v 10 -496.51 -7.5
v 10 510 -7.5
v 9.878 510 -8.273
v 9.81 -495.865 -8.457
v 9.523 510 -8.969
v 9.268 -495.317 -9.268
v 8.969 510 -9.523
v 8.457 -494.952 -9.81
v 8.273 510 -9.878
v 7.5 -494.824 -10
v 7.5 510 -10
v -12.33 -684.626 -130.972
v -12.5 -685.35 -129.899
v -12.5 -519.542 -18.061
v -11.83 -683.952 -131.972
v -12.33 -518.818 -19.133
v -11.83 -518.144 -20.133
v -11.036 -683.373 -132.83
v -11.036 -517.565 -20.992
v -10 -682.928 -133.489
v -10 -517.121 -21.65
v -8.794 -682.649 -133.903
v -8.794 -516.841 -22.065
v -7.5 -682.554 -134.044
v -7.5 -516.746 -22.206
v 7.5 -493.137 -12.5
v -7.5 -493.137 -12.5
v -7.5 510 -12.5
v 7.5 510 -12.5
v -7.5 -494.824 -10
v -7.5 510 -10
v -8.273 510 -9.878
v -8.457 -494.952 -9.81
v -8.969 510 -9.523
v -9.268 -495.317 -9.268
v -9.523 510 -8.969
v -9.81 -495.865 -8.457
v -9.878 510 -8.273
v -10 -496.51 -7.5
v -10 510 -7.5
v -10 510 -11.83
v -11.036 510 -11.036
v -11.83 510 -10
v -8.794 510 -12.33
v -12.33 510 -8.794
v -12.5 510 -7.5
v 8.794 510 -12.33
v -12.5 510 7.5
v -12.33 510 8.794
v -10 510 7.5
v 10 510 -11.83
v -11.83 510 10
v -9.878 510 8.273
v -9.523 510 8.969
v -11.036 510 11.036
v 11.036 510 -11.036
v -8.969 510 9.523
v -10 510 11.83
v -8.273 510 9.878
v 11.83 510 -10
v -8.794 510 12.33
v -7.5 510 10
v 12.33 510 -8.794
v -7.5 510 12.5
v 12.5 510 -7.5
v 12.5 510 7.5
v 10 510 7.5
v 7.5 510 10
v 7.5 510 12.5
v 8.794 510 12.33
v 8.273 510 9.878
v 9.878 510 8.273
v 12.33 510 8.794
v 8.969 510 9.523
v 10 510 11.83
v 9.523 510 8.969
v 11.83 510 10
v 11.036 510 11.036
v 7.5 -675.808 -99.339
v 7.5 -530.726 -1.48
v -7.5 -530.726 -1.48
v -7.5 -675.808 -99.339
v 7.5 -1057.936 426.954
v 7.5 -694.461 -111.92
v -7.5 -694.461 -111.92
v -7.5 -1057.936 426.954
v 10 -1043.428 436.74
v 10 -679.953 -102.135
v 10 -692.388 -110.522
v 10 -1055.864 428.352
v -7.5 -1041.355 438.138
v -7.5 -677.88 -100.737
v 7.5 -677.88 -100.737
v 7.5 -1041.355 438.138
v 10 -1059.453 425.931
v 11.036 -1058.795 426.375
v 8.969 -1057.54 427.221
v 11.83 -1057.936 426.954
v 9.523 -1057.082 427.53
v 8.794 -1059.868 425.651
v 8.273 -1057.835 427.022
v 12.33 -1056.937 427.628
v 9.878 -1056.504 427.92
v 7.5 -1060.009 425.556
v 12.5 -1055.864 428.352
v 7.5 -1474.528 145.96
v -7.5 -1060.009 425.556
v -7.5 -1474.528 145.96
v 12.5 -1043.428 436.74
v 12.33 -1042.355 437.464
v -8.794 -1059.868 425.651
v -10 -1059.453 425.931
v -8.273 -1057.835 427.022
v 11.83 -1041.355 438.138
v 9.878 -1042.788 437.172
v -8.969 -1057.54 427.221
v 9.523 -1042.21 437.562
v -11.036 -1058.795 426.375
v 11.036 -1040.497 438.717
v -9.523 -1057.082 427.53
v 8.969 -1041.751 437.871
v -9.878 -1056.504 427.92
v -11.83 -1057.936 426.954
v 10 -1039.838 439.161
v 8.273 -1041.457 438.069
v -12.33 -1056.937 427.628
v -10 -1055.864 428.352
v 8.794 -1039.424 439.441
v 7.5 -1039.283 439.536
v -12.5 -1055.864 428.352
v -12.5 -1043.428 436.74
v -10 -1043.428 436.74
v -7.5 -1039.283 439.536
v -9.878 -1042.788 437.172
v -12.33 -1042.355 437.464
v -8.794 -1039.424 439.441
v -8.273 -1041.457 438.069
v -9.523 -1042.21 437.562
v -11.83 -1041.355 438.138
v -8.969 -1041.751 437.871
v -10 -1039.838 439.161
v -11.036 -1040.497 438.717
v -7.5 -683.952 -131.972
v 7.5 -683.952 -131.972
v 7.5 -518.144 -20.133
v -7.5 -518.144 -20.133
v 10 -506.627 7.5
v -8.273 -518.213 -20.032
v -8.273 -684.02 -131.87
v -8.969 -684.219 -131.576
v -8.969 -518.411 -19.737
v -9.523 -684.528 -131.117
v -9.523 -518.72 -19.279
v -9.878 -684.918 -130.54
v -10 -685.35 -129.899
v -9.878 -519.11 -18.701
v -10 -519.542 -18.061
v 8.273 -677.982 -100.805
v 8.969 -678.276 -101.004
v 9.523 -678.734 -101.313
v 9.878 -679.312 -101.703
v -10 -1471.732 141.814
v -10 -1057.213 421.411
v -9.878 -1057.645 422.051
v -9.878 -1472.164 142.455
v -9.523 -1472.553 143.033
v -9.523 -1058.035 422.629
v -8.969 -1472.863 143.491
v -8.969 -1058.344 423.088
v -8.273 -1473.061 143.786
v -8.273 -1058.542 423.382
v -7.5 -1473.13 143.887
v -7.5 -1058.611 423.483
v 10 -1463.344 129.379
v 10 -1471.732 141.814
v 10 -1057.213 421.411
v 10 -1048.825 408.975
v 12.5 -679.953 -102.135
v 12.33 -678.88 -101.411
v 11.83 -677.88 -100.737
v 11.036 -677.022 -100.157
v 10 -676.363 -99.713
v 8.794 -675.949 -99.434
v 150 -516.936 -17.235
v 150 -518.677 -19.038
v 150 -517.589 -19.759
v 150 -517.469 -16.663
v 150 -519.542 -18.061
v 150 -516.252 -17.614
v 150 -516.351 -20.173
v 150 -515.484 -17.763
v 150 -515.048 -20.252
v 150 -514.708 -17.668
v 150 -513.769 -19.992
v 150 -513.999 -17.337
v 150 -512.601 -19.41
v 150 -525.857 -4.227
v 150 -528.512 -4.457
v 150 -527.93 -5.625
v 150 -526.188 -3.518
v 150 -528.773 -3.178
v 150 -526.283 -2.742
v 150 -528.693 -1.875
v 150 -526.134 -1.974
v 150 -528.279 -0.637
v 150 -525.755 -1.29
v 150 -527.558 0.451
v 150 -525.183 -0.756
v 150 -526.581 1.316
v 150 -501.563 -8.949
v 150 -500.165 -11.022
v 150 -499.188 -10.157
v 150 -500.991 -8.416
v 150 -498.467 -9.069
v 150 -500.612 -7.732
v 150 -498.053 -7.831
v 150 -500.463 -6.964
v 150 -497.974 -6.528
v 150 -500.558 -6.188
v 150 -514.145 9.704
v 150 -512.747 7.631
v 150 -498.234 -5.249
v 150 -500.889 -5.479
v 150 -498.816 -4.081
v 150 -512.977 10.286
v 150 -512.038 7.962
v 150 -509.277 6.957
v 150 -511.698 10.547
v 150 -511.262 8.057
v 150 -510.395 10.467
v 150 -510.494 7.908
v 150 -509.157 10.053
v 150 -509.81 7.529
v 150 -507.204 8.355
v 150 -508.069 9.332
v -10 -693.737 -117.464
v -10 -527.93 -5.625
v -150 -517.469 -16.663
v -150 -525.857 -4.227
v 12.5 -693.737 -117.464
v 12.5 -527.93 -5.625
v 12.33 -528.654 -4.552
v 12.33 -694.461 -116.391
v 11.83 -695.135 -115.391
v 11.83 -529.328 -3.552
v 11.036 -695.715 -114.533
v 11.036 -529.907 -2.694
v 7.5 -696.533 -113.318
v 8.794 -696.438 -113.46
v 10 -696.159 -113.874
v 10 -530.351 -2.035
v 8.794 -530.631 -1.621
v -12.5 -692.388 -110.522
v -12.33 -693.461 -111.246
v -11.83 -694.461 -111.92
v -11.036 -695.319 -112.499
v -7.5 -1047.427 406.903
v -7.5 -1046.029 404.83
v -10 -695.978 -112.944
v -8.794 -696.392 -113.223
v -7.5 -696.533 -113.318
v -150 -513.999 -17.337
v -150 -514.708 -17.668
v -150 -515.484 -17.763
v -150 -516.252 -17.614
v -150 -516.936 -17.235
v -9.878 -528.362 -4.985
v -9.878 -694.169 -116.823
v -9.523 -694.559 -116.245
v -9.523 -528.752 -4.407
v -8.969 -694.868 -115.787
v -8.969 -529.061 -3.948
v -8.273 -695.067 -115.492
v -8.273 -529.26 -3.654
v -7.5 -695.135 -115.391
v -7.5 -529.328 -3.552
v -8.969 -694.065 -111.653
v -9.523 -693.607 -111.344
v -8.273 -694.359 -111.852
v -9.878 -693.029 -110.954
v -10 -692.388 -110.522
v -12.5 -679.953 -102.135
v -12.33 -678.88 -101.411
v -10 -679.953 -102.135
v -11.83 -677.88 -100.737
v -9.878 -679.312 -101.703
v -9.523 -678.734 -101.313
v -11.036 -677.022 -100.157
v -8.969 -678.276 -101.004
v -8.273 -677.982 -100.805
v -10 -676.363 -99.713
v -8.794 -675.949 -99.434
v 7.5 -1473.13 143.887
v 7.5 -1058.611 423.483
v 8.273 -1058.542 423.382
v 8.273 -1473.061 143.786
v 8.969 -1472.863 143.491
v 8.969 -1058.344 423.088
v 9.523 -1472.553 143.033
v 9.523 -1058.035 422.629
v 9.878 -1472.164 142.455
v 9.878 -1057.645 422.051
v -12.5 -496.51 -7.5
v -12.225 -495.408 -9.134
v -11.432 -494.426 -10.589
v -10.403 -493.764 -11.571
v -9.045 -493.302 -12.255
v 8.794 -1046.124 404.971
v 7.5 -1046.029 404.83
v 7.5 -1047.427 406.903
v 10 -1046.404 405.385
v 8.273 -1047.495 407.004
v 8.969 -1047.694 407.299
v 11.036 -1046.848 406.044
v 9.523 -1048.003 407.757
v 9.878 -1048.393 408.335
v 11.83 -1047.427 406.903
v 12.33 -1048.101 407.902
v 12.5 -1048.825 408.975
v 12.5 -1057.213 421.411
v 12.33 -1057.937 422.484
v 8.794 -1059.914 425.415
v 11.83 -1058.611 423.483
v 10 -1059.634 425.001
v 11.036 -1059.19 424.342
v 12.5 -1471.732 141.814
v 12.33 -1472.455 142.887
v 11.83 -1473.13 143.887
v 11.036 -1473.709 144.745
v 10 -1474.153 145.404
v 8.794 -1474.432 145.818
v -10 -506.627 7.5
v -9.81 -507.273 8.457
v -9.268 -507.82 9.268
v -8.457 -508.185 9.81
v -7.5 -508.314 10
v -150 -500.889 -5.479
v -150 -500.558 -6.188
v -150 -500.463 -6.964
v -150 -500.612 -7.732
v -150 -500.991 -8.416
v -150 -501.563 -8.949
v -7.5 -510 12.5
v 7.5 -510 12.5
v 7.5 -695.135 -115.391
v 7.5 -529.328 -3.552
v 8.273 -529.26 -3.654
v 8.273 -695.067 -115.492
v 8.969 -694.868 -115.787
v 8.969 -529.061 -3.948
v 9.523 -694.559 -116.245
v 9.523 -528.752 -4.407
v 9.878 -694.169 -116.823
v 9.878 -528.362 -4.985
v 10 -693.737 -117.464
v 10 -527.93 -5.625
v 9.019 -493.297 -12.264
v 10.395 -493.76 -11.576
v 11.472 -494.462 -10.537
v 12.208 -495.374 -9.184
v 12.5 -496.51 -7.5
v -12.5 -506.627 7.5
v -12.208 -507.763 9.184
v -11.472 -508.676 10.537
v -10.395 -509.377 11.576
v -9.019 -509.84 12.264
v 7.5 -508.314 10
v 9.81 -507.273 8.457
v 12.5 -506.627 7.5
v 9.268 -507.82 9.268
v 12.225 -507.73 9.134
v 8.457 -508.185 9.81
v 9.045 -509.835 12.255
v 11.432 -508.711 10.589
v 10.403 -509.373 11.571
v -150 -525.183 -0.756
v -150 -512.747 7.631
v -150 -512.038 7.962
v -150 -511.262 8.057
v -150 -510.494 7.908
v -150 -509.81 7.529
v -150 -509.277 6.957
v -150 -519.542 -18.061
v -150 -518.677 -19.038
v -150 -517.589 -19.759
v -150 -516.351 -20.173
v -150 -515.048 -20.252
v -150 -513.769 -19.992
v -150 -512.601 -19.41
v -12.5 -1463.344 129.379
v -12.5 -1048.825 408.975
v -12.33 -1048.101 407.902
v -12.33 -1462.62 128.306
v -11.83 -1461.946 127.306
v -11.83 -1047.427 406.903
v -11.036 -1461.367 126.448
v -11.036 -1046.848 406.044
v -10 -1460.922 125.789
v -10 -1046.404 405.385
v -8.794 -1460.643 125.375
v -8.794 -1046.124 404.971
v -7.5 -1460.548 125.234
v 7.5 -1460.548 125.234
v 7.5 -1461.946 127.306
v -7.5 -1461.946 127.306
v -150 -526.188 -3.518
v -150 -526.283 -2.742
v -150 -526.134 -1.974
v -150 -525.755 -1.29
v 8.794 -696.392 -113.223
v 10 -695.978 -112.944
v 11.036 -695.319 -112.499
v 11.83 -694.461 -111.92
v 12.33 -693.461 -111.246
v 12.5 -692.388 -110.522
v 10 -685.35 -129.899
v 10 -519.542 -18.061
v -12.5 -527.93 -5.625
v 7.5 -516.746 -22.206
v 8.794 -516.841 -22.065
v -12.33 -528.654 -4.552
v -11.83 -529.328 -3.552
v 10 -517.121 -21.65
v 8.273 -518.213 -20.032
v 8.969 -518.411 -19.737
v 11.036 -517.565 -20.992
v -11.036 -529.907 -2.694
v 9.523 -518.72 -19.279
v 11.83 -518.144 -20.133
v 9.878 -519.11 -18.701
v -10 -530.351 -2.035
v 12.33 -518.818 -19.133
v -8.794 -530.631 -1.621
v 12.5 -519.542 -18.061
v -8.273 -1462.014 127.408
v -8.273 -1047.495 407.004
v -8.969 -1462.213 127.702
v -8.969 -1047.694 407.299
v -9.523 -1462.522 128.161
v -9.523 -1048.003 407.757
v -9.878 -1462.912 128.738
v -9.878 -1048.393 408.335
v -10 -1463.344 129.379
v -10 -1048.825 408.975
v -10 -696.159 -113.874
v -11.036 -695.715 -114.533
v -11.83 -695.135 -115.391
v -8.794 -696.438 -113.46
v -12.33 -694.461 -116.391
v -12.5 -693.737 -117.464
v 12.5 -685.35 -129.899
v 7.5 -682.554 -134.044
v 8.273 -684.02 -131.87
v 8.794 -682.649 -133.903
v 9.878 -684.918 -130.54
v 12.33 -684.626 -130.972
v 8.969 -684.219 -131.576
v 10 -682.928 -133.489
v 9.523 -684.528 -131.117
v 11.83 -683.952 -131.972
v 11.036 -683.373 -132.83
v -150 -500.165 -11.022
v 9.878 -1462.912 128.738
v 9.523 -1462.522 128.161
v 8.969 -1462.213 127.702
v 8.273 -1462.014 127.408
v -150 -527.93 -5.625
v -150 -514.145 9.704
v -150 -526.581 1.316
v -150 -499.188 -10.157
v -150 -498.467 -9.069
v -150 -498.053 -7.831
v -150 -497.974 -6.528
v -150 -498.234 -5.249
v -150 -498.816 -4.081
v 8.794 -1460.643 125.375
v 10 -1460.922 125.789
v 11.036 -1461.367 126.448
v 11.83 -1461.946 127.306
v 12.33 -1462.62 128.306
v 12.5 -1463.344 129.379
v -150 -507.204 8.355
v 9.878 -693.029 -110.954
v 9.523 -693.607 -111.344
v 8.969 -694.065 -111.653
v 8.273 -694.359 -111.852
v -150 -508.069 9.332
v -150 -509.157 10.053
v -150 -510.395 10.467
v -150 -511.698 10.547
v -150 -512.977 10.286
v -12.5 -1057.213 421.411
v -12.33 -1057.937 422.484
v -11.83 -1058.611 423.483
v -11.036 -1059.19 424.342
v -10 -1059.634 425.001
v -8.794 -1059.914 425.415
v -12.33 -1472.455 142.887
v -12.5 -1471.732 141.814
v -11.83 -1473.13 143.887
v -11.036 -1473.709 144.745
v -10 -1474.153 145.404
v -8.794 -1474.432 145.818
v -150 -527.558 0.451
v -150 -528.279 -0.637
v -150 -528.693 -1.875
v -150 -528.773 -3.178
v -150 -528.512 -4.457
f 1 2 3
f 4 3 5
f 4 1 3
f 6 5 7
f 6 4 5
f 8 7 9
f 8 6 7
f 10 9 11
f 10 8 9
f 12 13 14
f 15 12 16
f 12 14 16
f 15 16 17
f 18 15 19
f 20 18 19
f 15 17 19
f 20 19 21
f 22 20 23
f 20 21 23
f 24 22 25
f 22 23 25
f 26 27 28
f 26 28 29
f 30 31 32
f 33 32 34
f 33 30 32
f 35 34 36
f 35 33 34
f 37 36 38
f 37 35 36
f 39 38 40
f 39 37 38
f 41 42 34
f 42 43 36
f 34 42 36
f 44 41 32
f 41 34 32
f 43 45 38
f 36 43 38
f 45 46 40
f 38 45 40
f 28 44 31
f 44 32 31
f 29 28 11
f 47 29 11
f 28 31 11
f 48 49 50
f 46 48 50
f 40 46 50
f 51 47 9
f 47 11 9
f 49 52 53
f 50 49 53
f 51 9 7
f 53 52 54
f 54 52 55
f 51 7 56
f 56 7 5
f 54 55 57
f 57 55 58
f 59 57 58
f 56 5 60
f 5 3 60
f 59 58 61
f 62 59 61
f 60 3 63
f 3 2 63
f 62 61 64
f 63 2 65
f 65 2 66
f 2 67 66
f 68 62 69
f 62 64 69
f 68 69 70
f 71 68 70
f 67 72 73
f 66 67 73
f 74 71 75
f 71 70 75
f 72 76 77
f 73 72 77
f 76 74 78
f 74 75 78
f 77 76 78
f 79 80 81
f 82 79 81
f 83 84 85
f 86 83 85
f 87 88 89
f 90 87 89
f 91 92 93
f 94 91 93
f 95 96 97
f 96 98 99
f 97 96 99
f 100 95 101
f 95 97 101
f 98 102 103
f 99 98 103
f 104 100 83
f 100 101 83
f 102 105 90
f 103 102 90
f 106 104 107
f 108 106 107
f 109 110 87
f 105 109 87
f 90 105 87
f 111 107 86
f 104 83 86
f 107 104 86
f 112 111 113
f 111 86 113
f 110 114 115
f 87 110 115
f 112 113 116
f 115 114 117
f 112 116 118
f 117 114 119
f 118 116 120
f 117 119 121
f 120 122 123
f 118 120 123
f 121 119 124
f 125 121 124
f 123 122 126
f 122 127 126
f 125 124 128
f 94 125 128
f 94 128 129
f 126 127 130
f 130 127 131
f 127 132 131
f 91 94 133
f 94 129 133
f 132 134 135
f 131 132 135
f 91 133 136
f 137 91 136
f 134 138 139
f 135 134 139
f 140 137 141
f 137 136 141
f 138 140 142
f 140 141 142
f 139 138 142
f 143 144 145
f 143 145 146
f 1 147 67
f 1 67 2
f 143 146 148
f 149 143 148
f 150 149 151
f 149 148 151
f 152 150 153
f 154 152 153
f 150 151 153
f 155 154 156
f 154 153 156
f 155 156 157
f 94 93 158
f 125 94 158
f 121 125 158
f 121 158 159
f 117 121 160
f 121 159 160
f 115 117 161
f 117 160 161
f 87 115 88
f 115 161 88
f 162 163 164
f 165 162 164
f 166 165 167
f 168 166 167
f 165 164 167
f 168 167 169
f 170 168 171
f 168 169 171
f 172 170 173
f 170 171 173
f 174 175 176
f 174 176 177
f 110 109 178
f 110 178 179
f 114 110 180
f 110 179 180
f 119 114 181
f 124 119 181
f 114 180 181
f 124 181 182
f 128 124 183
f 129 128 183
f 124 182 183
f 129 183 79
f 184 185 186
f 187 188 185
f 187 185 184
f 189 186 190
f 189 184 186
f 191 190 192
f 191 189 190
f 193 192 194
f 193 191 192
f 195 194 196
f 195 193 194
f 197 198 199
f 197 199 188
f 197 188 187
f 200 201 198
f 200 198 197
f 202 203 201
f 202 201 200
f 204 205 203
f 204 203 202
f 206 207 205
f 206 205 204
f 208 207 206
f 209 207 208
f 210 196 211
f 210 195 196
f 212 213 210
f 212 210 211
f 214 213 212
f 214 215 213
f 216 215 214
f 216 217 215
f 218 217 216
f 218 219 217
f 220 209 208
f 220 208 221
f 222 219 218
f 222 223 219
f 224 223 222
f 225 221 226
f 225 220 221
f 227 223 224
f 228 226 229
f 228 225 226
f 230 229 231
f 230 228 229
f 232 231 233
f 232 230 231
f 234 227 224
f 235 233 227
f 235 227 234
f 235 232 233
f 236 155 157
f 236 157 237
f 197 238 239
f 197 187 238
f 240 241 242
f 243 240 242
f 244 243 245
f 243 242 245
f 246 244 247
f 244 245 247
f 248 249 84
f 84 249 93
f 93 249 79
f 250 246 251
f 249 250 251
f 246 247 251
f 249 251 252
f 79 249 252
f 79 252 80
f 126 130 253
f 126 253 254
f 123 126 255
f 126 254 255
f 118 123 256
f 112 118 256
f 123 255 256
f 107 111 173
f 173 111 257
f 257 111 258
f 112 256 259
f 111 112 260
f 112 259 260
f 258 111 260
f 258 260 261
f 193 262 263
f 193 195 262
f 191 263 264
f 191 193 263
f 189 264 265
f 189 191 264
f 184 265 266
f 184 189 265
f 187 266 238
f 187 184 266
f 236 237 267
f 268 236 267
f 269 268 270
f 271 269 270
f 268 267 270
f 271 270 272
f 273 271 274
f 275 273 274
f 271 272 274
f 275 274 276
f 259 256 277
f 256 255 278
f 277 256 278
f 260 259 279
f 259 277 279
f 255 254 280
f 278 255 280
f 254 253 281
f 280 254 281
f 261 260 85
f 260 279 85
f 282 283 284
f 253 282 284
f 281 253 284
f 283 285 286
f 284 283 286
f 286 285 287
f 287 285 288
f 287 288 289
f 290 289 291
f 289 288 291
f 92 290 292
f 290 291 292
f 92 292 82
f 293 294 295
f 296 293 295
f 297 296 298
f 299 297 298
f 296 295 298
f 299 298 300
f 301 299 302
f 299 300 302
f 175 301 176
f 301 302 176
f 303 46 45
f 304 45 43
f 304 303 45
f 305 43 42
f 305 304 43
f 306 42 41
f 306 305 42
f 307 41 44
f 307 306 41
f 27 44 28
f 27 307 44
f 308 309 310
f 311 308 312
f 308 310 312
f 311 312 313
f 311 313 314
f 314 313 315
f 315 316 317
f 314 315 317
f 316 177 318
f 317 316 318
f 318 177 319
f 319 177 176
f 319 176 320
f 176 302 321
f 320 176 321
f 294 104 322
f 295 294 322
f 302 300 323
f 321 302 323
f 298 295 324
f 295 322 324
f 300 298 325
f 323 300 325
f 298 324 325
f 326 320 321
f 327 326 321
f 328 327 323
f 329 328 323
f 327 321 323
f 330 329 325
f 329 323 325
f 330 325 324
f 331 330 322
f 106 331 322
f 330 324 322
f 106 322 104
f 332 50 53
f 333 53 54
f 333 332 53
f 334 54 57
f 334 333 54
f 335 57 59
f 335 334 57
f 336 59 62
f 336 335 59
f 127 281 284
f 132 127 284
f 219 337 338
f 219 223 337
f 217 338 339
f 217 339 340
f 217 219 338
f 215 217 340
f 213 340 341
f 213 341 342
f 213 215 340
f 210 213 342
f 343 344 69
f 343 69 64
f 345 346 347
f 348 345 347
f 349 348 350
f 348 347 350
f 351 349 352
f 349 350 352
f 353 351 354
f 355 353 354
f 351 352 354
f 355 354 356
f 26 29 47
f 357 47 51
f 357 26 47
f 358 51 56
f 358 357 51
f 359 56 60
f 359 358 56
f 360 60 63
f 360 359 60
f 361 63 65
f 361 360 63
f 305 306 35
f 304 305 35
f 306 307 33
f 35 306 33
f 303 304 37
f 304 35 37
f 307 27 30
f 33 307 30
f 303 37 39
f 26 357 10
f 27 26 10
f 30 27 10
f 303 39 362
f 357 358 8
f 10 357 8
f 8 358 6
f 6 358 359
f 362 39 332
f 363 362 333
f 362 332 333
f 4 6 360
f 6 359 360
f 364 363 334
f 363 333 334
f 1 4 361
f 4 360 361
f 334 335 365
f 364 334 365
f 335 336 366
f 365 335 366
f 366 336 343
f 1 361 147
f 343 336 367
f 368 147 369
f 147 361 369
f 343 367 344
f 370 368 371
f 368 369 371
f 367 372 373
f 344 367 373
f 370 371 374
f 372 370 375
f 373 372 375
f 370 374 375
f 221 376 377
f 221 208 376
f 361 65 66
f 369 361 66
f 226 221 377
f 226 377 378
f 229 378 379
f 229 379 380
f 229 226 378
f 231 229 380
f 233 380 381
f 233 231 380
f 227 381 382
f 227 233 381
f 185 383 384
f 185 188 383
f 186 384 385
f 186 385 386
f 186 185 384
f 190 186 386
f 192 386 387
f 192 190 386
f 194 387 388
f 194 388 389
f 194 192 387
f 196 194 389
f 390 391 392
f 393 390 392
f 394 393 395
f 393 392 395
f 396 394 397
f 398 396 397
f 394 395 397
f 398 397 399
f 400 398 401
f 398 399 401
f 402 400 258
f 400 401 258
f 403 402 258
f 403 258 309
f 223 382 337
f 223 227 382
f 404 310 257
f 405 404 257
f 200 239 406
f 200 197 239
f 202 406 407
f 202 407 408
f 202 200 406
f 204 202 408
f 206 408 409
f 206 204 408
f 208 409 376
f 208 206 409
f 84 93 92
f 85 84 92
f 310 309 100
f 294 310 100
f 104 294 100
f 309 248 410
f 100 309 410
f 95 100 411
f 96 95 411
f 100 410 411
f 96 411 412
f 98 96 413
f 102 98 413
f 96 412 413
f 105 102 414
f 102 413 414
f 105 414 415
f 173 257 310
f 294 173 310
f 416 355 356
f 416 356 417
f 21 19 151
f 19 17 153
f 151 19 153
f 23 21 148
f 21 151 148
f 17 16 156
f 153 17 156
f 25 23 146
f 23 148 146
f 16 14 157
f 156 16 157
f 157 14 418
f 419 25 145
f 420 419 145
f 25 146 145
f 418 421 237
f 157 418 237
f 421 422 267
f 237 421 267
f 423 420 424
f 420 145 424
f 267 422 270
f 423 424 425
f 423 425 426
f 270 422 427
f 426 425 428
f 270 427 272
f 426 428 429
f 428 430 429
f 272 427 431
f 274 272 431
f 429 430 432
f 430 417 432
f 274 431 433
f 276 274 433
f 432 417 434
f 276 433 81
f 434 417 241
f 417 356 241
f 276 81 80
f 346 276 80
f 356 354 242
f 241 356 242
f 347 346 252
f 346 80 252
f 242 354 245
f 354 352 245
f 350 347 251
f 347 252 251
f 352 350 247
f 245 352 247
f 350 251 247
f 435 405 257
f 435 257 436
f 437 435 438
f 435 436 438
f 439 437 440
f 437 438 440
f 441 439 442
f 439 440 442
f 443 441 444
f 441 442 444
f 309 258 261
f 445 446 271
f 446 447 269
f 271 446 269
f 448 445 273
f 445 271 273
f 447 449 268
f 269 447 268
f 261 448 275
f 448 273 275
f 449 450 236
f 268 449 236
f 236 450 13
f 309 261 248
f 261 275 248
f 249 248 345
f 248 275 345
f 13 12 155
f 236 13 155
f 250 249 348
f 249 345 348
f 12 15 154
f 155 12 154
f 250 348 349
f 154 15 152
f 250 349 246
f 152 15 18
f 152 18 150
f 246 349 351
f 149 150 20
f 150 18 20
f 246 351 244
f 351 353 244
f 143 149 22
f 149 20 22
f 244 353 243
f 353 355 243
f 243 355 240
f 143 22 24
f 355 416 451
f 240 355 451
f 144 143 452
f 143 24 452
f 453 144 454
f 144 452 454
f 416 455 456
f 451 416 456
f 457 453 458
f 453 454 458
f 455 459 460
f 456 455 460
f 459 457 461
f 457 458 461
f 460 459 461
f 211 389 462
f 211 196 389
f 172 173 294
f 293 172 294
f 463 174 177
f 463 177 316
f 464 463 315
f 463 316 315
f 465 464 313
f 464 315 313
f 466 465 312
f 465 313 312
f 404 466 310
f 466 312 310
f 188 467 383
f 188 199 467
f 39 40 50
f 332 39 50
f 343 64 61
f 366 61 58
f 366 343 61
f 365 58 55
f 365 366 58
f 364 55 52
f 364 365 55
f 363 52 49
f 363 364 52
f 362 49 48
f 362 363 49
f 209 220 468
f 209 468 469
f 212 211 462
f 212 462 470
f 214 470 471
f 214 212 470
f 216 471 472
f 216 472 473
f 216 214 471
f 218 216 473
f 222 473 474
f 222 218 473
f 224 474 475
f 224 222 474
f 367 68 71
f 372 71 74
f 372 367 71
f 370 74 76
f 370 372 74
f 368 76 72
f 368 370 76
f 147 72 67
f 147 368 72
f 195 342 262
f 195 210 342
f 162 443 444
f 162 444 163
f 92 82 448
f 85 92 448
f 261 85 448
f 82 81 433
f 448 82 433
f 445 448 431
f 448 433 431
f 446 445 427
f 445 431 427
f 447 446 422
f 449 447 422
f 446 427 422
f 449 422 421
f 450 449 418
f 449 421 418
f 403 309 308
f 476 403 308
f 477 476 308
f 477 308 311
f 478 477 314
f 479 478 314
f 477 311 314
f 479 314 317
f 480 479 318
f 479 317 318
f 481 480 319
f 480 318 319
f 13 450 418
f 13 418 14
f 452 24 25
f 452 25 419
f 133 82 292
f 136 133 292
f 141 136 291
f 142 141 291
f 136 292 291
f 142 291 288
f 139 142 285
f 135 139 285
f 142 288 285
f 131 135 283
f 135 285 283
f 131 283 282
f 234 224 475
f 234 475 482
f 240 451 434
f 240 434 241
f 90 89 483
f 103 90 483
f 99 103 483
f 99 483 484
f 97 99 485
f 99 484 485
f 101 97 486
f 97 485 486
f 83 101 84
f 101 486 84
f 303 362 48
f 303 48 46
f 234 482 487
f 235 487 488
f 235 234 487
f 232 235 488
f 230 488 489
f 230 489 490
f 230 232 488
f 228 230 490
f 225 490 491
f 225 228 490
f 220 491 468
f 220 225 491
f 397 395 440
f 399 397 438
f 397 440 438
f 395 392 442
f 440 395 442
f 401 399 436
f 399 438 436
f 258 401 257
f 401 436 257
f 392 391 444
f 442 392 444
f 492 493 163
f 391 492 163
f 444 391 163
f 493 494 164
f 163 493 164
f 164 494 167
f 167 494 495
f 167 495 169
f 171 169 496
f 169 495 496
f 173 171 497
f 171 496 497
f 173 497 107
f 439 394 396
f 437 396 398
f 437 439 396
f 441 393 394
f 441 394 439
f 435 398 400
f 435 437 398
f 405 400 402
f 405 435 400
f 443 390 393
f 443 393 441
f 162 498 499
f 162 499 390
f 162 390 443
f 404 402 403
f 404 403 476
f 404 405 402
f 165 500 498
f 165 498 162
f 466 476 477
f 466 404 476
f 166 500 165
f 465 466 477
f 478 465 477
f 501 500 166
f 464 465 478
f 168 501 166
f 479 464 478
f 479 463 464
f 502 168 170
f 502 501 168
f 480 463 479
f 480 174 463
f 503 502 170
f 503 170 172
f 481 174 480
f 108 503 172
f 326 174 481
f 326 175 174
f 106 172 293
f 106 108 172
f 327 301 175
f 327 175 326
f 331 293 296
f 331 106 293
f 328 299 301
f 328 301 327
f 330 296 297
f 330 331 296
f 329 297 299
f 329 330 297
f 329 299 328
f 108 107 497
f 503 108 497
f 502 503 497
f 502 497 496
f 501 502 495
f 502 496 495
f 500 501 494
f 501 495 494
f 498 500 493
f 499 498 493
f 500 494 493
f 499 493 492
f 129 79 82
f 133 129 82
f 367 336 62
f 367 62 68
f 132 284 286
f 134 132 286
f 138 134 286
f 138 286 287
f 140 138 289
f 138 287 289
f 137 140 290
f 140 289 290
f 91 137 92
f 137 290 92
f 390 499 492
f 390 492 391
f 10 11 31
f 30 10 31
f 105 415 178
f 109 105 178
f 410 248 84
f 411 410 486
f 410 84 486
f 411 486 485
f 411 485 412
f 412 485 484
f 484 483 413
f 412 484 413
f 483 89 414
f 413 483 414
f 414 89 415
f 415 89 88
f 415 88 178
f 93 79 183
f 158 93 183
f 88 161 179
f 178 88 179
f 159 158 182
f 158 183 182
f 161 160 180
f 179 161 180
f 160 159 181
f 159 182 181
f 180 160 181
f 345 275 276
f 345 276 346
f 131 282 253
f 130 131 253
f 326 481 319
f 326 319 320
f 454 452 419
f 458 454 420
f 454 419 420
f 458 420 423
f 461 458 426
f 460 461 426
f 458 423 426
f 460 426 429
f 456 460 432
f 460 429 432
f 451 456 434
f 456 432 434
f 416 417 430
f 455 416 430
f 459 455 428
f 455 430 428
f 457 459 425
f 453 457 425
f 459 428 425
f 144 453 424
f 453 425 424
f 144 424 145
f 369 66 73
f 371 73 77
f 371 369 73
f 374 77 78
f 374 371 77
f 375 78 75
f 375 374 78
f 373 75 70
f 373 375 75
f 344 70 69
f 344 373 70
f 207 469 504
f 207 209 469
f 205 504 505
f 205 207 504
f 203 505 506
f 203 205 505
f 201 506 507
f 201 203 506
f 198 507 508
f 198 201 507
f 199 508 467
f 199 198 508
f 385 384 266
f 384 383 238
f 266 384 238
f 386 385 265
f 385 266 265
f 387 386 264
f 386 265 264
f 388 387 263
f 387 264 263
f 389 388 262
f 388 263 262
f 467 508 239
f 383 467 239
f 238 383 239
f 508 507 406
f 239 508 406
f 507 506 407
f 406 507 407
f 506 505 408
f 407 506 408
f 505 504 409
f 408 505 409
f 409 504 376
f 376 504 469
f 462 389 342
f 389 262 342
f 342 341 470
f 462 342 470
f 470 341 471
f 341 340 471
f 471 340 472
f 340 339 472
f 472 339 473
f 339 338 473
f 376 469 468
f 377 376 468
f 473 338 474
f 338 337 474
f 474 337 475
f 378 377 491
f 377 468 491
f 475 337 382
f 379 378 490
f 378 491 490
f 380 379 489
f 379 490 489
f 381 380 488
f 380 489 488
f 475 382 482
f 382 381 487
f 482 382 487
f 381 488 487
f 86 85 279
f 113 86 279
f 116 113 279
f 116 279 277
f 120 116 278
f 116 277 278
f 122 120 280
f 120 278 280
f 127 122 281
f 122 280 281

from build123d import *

# Parameters (mm, degrees)
F1_DEPTH  = 510
F3_DEPTH  = 25.001
F5_DEPTH  = 150
F7_DEPTH  = 200
F9_DEPTH  = 650
F11_DEPTH = 500


with BuildPart() as f1:
    # F0 (on Front) → F1 (new body, symmetric)
    with BuildSketch(Plane.XZ):
        with BuildLine():
            ThreePointArc((12.5, 7.5), (11.0355339059, 11.0355339059), (7.5, 12.5))
            Line((7.5, 12.5), (-7.5, 12.5))
            ThreePointArc((-7.5, 12.5), (-11.0355339059, 11.0355339059), (-12.5, 7.5))
            Line((-12.5, 7.5), (-12.5, -7.5))
            ThreePointArc((-12.5, -7.5), (-11.0355339059, -11.0355339059), (-7.5, -12.5))
            Line((-7.5, -12.5), (7.5, -12.5))
            ThreePointArc((7.5, -12.5), (11.0355339059, -11.0355339059), (12.5, -7.5))
            Line((12.5, -7.5), (12.5, 7.5))
        make_face()
        with BuildLine():
            ThreePointArc((7.5, 10), (9.267766953, 9.267766953), (10, 7.5))
            Line((10, 7.5), (10, -7.5))
            ThreePointArc((10, -7.5), (9.267766953, -9.267766953), (7.5, -10))
            Line((7.5, -10), (-7.5, -10))
            ThreePointArc((-7.5, -10), (-9.267766953, -9.267766953), (-10, -7.5))
            Line((-10, -7.5), (-10, 7.5))
            ThreePointArc((-10, 7.5), (-9.267766953, 9.267766953), (-7.5, 10))
            Line((-7.5, 10), (7.5, 10))
        make_face(mode=Mode.SUBTRACT)
    extrude(amount=F1_DEPTH, both=True)

    # F2 (on face) → F3 (cut, through all)
    with BuildSketch(Plane.YZ.offset(12.5)):
        Polygon((-493.1372870789, -12.5), (-510, 12.5), (-510, -12.5), align=None)
    extrude(amount=-F3_DEPTH, mode=Mode.SUBTRACT)


with BuildPart() as f5:
    # F4 (on Right) → F5 (new body, symmetric)
    with BuildSketch(Plane.YZ):
        with BuildLine():
            Line((-512.6009288643, -19.4097973833), (-500.165365276, -11.0219038312))
            ThreePointArc((-500.165365276, -11.0219038312), (-498.0531938761, -7.8307609453), (-498.8161419306, -4.0807514511))
            Line((-498.8161419306, -4.0807514511), (-507.2040354826, 8.3548121372))
            ThreePointArc((-507.2040354826, 8.3548121372), (-510.3951783685, 10.4669835371), (-514.1451878628, 9.7040354826))
            Line((-514.1451878628, 9.7040354826), (-526.5807514511, 1.3161419306))
            ThreePointArc((-526.5807514511, 1.3161419306), (-528.692922851, -1.8750009553), (-527.9299747965, -5.6250104495))
            Line((-527.9299747965, -5.6250104495), (-519.5420812445, -18.0605740379))
            ThreePointArc((-519.5420812445, -18.0605740379), (-516.3509383586, -20.1727454378), (-512.6009288643, -19.4097973833))
        make_face()
        with BuildLine():
            ThreePointArc((-512.7472056041, 7.6314415513), (-510.872200857, 8.0129155785), (-509.276629414, 6.9568298785))
            Line((-509.276629414, 6.9568298785), (-500.888735862, -5.4787337098))
            ThreePointArc((-500.888735862, -5.4787337098), (-500.5072618347, -7.3537384569), (-501.5633475347, -8.9493098998))
            Line((-501.5633475347, -8.9493098998), (-513.998911123, -17.3372034519))
            ThreePointArc((-513.998911123, -17.3372034519), (-515.8739158701, -17.7186774791), (-517.4694873131, -16.6625917792))
            Line((-517.4694873131, -16.6625917792), (-525.8573808651, -4.2270281909))
            ThreePointArc((-525.8573808651, -4.2270281909), (-526.2388548924, -2.3520234437), (-525.1827691924, -0.7564520008))
            Line((-525.1827691924, -0.7564520008), (-512.7472056041, 7.6314415513))
        make_face(mode=Mode.SUBTRACT)
    extrude(amount=F5_DEPTH, both=True)


with BuildPart() as f7:
    # F6 (on face) → F7 (new body)
    with BuildSketch(Plane(origin=(0, -365.4557215439, -246.5029967101), x_dir=(1, 0, 0), z_dir=(0, -0.8290375726, -0.5591929035))):
        with BuildLine():
            ThreePointArc((12.5, 290.551350427), (11.0355339059, 294.086884333), (7.5, 295.551350427))
            Line((7.5, 295.551350427), (-7.5, 295.551350427))
            ThreePointArc((-7.5, 295.551350427), (-11.0355339059, 294.086884333), (-12.5, 290.551350427))
            Line((-12.5, 290.551350427), (-12.5, 275.551350427))
            ThreePointArc((-12.5, 275.551350427), (-11.0355339059, 272.0158165211), (-7.5, 270.551350427))
            Line((-7.5, 270.551350427), (7.5, 270.551350427))
            ThreePointArc((7.5, 270.551350427), (11.0355339059, 272.0158165211), (12.5, 275.551350427))
            Line((12.5, 275.551350427), (12.5, 290.551350427))
        make_face()
        with BuildLine():
            Line((-7.5, 293.051350427), (7.5, 293.051350427))
            ThreePointArc((7.5, 293.051350427), (9.267766953, 292.31911738), (10, 290.551350427))
            Line((10, 290.551350427), (10, 275.551350427))
            ThreePointArc((10, 275.551350427), (9.267766953, 273.7835834741), (7.5, 273.051350427))
            Line((7.5, 273.051350427), (-7.5, 273.051350427))
            ThreePointArc((-7.5, 273.051350427), (-9.267766953, 273.7835834741), (-10, 275.551350427))
            Line((-10, 275.551350427), (-10, 290.551350427))
            ThreePointArc((-10, 290.551350427), (-9.267766953, 292.31911738), (-7.5, 293.051350427))
        make_face(mode=Mode.SUBTRACT)
    extrude(amount=F7_DEPTH)

    # F8 (on face) → F9 (join)
    with BuildSketch(Plane(origin=(0, -165.27021777, 245.0231741234), x_dir=(1, 0, 0), z_dir=(0, -0.5591929035, 0.8290375726))):
        with BuildLine():
            Line((-7.5, -640.8192507097), (7.5, -640.8192507097))
            ThreePointArc((7.5, -640.8192507097), (11.0355339059, -639.3547846156), (12.5, -635.8192507097))
            Line((12.5, -635.8192507097), (12.5, -620.8192507097))
            ThreePointArc((12.5, -620.8192507097), (11.0355339059, -617.2837168038), (7.5, -615.8192507097))
            Line((7.5, -615.8192507097), (-7.5, -615.8192507097))
            ThreePointArc((-7.5, -615.8192507097), (-11.0355339059, -617.2837168038), (-12.5, -620.8192507097))
            Line((-12.5, -620.8192507097), (-12.5, -635.8192507097))
            ThreePointArc((-12.5, -635.8192507097), (-11.0355339059, -639.3547846156), (-7.5, -640.8192507097))
        make_face()
        with BuildLine():
            ThreePointArc((7.5, -618.3192507097), (9.267766953, -619.0514837567), (10, -620.8192507097))
            Line((10, -620.8192507097), (10, -635.8192507097))
            ThreePointArc((10, -635.8192507097), (9.267766953, -637.5870176627), (7.5, -638.3192507097))
            Line((7.5, -638.3192507097), (-7.5, -638.3192507097))
            ThreePointArc((-7.5, -638.3192507097), (-9.267766953, -637.5870176627), (-10, -635.8192507097))
            Line((-10, -635.8192507097), (-10, -620.8192507097))
            ThreePointArc((-10, -620.8192507097), (-9.267766953, -619.0514837567), (-7.5, -618.3192507097))
            Line((-7.5, -618.3192507097), (7.5, -618.3192507097))
        make_face(mode=Mode.SUBTRACT)
    extrude(amount=F9_DEPTH)

    # F10 (on face) → F11 (join)
    with BuildSketch(Plane(origin=(0, -531.2632360549, -358.3415774043), x_dir=(1, 0, 0), z_dir=(0, -0.8290375726, -0.5591929035))):
        with BuildLine():
            ThreePointArc((12.5, 940.551350427), (11.0355339059, 944.086884333), (7.5, 945.551350427))
            Line((7.5, 945.551350427), (-7.5, 945.551350427))
            ThreePointArc((-7.5, 945.551350427), (-11.0355339059, 944.086884333), (-12.5, 940.551350427))
            Line((-12.5, 940.551350427), (-12.5, 925.551350427))
            ThreePointArc((-12.5, 925.551350427), (-11.0355339059, 922.0158165211), (-7.5, 920.551350427))
            Line((-7.5, 920.551350427), (7.5, 920.551350427))
            ThreePointArc((7.5, 920.551350427), (11.0355339059, 922.0158165211), (12.5, 925.551350427))
            Line((12.5, 925.551350427), (12.5, 940.551350427))
        make_face()
        with BuildLine():
            ThreePointArc((7.5, 943.051350427), (9.267766953, 942.31911738), (10, 940.551350427))
            Line((10, 940.551350427), (10, 925.551350427))
            ThreePointArc((10, 925.551350427), (9.267766953, 923.7835834741), (7.5, 923.051350427))
            Line((7.5, 923.051350427), (-7.5, 923.051350427))
            ThreePointArc((-7.5, 923.051350427), (-9.267766953, 923.7835834741), (-10, 925.551350427))
            Line((-10, 925.551350427), (-10, 940.551350427))
            ThreePointArc((-10, 940.551350427), (-9.267766953, 942.31911738), (-7.5, 943.051350427))
            Line((-7.5, 943.051350427), (7.5, 943.051350427))
        make_face(mode=Mode.SUBTRACT)
    extrude(amount=F11_DEPTH)


solid = Compound([f1.part, f5.part, f7.part])
